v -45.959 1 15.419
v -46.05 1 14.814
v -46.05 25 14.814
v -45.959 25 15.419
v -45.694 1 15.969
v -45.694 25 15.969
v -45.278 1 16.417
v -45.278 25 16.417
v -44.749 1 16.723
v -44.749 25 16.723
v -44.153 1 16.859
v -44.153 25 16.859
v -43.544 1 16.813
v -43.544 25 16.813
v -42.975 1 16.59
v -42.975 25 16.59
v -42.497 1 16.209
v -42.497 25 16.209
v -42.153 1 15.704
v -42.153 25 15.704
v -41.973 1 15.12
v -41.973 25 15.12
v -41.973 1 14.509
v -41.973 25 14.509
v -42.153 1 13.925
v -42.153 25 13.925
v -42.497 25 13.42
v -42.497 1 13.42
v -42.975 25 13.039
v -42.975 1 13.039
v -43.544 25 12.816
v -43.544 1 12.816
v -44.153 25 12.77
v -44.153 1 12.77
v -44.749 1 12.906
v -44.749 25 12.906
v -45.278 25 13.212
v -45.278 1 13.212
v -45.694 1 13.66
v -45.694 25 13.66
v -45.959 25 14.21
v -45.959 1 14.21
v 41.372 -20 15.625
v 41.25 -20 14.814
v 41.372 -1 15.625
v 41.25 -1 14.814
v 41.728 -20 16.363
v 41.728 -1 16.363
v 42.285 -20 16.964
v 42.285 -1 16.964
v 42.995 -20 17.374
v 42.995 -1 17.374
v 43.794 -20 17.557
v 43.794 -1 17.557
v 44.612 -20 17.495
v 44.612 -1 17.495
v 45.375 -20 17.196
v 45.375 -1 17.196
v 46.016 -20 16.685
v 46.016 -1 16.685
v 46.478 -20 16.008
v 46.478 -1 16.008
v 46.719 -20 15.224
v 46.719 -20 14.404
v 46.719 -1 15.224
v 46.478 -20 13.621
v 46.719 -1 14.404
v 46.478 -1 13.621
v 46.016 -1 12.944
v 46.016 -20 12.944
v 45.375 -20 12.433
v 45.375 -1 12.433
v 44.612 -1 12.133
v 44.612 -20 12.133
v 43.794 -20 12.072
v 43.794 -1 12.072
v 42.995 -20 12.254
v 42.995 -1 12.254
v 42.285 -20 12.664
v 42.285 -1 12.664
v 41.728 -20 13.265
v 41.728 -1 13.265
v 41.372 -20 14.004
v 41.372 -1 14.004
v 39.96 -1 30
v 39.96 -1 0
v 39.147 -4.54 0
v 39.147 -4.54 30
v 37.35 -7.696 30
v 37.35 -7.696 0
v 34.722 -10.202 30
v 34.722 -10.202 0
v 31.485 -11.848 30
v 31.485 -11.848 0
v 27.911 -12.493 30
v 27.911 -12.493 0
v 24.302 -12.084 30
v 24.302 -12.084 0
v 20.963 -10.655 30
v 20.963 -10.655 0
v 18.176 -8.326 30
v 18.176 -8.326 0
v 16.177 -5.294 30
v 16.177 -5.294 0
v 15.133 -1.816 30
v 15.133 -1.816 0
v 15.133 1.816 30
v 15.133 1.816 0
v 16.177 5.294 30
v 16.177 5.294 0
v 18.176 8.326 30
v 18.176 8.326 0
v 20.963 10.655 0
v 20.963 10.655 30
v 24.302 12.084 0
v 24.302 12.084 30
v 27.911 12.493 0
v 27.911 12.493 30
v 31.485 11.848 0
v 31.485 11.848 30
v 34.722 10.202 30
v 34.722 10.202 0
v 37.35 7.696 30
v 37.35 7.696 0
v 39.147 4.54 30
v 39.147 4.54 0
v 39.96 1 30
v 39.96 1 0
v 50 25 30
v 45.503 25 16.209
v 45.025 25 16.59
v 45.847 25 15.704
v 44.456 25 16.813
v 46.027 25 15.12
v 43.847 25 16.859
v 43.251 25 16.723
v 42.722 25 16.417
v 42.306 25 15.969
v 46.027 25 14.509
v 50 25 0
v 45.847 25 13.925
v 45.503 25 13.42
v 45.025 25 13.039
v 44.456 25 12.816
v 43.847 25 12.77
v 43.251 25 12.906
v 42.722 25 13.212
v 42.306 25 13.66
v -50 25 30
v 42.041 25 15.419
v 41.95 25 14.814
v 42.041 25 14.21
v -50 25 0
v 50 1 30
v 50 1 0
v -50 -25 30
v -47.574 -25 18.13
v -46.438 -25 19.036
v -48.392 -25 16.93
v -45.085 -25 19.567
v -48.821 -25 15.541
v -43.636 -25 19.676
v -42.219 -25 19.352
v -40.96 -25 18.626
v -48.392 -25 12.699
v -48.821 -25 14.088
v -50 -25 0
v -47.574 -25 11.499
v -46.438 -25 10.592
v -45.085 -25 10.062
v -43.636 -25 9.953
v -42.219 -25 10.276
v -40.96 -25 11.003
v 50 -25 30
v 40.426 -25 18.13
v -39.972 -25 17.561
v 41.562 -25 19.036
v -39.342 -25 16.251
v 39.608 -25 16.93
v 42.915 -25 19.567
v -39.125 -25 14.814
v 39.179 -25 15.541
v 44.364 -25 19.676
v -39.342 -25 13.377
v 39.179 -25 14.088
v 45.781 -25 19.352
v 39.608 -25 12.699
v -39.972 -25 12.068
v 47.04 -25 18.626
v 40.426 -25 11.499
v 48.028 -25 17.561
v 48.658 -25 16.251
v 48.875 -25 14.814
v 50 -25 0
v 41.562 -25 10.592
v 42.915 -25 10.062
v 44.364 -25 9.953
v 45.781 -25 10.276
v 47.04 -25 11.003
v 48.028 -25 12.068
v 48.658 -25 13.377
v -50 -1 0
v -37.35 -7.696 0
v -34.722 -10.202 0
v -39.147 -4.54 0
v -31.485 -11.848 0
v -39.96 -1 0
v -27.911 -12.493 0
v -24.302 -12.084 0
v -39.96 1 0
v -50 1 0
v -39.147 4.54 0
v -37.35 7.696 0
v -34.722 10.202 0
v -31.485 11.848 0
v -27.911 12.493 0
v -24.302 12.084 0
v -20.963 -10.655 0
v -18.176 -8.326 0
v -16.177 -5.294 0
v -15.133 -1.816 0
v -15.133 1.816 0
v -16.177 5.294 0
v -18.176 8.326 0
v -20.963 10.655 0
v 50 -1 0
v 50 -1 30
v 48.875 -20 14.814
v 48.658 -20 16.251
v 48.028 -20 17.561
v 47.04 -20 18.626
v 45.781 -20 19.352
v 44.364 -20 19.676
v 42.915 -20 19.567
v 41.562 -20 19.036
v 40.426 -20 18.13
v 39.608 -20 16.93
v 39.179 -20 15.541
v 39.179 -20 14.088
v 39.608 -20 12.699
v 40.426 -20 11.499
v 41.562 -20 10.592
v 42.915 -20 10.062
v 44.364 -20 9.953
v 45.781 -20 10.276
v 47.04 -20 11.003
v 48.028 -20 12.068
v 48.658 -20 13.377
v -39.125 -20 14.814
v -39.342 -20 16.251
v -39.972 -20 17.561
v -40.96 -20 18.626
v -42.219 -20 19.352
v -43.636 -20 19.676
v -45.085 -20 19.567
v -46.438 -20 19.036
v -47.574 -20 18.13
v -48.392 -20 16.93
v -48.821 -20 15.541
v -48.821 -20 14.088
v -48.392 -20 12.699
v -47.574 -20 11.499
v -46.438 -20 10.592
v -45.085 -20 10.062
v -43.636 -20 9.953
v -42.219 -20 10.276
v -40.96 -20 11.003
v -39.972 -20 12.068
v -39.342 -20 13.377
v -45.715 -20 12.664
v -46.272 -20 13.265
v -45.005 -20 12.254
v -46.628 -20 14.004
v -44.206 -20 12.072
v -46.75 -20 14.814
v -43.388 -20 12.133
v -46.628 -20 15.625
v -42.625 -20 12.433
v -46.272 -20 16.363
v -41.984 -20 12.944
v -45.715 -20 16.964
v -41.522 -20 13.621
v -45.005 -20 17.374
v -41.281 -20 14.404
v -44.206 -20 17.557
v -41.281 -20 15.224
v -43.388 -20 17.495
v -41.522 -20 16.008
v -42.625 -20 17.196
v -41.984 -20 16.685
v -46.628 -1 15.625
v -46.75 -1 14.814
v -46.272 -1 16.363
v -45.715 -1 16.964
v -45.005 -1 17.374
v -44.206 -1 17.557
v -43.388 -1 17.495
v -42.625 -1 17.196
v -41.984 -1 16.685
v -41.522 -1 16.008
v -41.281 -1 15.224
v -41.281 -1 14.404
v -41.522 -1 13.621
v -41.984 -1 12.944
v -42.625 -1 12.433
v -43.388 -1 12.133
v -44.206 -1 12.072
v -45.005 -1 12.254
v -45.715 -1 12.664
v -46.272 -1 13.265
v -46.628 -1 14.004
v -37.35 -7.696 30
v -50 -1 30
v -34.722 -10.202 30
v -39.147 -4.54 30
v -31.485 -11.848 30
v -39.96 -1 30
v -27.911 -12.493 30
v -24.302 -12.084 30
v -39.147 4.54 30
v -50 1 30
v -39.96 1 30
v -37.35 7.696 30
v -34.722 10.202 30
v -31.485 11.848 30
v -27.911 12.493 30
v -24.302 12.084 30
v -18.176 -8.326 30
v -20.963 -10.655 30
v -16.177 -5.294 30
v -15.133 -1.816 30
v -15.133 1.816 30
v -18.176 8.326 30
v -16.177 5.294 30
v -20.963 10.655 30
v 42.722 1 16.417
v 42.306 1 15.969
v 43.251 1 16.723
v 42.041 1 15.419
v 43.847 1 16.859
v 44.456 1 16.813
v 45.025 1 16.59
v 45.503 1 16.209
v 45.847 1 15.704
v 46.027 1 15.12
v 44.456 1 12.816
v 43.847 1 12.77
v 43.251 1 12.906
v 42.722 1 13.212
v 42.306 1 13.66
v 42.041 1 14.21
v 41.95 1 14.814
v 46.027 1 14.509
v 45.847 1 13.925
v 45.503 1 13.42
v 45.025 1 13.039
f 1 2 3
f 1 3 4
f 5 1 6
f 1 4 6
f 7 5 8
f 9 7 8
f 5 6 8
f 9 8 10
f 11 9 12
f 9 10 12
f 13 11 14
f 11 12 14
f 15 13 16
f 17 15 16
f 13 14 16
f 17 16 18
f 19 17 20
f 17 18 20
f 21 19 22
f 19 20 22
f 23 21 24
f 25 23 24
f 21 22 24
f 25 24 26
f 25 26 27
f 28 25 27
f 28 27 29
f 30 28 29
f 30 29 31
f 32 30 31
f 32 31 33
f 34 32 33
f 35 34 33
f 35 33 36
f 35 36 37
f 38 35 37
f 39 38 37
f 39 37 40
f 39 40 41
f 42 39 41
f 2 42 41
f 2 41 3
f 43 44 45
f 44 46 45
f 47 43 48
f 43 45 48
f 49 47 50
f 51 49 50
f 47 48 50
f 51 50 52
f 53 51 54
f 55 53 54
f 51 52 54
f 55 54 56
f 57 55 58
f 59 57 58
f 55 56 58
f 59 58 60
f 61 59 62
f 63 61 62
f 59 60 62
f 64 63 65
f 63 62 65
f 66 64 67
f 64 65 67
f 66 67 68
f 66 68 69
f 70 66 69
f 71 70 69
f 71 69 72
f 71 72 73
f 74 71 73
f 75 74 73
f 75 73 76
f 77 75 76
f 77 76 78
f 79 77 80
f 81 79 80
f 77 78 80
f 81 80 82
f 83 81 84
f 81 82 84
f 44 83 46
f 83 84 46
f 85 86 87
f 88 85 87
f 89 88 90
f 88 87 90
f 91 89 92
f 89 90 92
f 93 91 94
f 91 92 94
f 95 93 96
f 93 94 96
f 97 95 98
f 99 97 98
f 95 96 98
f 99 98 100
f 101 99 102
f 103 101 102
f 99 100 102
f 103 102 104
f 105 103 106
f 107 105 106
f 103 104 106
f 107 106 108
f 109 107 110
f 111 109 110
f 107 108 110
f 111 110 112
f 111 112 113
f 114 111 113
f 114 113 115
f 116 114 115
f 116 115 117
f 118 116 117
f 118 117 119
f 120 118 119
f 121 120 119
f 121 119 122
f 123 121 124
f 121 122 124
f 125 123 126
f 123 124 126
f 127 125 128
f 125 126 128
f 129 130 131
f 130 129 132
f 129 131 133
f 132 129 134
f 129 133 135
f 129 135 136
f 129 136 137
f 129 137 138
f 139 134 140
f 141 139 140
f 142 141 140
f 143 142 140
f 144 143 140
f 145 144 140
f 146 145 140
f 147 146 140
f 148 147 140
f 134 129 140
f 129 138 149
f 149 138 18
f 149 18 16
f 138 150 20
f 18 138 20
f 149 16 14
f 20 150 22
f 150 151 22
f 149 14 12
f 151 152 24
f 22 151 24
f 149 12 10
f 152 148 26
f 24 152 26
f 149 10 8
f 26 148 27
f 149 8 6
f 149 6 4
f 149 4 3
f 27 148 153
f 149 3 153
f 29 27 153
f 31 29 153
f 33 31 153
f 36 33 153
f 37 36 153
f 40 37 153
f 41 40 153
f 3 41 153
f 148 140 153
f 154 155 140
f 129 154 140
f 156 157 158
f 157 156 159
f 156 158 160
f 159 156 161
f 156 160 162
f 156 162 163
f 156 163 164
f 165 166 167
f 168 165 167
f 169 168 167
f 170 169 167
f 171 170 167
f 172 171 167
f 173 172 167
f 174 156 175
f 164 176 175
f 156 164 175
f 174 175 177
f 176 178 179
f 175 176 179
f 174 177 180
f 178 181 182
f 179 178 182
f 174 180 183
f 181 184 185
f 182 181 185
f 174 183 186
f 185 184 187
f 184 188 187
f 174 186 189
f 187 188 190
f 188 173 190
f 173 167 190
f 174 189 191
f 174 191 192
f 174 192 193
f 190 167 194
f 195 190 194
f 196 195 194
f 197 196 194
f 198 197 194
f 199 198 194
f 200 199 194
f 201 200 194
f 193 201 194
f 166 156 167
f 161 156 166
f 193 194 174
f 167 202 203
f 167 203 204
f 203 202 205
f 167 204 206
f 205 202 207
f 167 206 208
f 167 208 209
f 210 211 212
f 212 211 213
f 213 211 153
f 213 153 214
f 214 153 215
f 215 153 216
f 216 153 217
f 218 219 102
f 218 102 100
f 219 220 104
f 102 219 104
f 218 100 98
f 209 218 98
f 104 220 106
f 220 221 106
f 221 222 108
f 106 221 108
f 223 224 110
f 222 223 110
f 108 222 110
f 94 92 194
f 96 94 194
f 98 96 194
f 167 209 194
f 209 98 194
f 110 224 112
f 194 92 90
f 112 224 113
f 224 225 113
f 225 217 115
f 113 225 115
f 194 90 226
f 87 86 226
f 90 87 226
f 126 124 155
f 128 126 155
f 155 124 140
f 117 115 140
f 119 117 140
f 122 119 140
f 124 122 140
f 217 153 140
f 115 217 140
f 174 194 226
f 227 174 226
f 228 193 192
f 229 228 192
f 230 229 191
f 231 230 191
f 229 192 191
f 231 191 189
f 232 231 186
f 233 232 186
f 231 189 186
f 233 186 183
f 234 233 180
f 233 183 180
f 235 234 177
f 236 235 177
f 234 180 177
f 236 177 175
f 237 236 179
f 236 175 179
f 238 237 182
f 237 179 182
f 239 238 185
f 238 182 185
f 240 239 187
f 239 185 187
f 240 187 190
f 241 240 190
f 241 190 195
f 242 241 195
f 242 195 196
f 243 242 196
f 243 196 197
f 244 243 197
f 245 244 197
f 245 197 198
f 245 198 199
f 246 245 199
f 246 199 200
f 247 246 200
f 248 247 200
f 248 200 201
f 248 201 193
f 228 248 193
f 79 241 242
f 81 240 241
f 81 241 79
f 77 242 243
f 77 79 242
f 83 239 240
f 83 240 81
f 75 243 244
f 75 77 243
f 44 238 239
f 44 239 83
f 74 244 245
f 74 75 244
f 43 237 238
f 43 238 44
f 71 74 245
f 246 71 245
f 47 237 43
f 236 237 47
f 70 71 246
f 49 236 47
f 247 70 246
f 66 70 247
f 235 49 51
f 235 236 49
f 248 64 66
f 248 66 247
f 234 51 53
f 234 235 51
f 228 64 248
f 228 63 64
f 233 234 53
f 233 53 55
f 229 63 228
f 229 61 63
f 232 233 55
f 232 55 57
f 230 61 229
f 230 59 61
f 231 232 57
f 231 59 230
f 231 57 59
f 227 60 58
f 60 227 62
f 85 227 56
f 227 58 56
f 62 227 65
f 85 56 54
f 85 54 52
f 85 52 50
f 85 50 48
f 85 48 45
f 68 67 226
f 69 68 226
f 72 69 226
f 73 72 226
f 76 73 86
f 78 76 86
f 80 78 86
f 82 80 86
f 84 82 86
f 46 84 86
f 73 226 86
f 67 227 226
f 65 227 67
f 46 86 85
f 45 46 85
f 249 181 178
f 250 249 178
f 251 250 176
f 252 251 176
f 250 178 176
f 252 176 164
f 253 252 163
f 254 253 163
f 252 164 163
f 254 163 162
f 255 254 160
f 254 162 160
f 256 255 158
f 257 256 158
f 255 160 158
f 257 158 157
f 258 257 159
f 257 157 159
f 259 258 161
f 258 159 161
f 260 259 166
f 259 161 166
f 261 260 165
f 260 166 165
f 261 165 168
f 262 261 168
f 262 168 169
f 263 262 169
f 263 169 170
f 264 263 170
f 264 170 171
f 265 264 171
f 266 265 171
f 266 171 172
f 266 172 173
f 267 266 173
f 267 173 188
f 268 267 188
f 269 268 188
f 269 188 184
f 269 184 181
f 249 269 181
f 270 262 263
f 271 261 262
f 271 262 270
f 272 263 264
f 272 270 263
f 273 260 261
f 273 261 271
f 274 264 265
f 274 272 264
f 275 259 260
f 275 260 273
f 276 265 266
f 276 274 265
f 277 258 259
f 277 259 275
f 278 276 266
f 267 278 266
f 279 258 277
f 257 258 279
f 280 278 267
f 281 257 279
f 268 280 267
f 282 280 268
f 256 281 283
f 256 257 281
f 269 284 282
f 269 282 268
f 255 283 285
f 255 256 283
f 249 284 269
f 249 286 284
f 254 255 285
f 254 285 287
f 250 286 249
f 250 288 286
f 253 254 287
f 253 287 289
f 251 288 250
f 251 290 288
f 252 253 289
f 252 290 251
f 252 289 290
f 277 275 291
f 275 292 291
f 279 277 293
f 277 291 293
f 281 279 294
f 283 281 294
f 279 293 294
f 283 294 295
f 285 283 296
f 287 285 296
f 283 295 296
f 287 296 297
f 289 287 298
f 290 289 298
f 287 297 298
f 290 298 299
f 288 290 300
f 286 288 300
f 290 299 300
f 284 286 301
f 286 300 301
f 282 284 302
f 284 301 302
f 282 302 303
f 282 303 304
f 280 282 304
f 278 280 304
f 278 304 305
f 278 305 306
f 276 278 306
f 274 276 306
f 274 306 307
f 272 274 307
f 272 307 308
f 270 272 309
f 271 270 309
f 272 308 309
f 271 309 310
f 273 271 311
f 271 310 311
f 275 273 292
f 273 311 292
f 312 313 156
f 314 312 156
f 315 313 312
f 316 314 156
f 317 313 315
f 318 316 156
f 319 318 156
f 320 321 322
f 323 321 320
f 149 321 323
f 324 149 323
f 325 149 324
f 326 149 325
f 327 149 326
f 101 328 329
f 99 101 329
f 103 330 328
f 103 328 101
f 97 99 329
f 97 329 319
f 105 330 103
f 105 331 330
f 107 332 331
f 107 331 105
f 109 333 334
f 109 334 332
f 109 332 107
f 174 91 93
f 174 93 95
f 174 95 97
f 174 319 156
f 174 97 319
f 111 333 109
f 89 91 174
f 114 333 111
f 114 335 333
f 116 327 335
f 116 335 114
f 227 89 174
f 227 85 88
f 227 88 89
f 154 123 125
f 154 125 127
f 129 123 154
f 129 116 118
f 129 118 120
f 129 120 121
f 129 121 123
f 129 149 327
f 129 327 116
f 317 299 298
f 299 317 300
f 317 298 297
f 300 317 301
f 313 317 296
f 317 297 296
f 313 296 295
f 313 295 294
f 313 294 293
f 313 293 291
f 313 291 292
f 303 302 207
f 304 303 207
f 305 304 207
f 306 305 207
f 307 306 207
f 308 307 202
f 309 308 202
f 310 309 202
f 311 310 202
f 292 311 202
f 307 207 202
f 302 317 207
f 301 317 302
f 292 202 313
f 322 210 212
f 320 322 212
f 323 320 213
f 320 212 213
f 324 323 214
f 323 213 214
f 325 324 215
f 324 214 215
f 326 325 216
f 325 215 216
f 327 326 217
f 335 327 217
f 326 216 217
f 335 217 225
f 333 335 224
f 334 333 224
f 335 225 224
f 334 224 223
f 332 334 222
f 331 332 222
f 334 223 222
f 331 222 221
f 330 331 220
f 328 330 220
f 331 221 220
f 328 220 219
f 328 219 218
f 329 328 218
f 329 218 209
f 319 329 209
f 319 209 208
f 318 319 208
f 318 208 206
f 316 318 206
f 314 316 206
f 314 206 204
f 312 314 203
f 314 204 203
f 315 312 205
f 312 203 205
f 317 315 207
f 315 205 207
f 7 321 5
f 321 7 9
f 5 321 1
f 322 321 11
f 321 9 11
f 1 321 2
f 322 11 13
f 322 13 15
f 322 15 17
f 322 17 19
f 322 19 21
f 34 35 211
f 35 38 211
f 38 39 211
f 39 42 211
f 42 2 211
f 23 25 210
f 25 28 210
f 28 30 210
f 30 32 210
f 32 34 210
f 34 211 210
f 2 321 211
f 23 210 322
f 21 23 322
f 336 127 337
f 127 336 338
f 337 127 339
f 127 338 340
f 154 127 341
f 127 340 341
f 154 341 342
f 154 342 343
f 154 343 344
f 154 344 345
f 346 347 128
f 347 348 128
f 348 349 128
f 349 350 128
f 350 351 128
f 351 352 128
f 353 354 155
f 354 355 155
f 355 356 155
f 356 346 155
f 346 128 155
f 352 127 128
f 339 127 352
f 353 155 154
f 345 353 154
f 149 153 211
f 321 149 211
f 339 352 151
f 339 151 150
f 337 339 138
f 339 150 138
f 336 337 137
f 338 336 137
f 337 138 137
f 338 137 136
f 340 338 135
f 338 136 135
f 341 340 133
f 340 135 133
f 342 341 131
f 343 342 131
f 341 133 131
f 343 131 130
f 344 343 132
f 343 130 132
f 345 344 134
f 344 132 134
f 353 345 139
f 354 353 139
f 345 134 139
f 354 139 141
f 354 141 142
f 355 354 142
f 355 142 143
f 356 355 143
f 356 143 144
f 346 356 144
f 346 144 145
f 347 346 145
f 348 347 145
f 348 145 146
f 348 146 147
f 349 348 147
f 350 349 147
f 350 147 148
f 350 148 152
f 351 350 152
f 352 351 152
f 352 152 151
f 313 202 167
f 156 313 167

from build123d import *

# Parameters (mm, degrees)
F1_DEPTH       = 30
F3_D           = 5.5
F3_DEPTH       = 25
F3_CBORE_D     = 9.75
F3_CBORE_DEPTH = 5
F3_TIP         = 1.6523667023
F5_D           = 4.1


with BuildPart() as f1:
    # F0 (on Top) → F1 (new body)
    with BuildSketch(Plane.XY):
        with BuildLine():
            Line((50, 1), (50, 25))
            Line((50, 25), (-50, 25))
            Line((-50, 25), (-50, 1))
            Line((-50, 1), (-39.9599357944, 1))
            ThreePointArc((-39.9599357944, 1), (-15, 0), (-39.9599357944, -1))
            Line((-39.9599357944, -1), (-50, -1))
            Line((-50, -1), (-50, -25))
            Line((-50, -25), (50, -25))
            Line((50, -25), (50, -1))
            Line((50, -1), (39.9599357944, -1))
            ThreePointArc((39.9599357944, -1), (15, 0), (39.9599357944, 1))
            Line((39.9599357944, 1), (50, 1))
        make_face()
    extrude(amount=F1_DEPTH)

    # F3
    with Locations(Plane.XZ.offset(25)):
        with Locations((-44, 14.8143433034), (44, 14.8143433034)):
            CounterBoreHole(F3_D / 2, F3_CBORE_D / 2, F3_CBORE_DEPTH, depth=F3_DEPTH)
            with Locations((0, 0, -(F3_DEPTH + F3_TIP / 2))):  # 118° drill point
                Cone(0, F3_D / 2, F3_TIP, mode=Mode.SUBTRACT)

    # F5 (through all)
    with Locations(Plane.XZ.offset(-1)):
        with Locations((-44, 14.8143433034), (44, 14.8143433034)):
            Hole(F5_D / 2)


solid = f1.part
